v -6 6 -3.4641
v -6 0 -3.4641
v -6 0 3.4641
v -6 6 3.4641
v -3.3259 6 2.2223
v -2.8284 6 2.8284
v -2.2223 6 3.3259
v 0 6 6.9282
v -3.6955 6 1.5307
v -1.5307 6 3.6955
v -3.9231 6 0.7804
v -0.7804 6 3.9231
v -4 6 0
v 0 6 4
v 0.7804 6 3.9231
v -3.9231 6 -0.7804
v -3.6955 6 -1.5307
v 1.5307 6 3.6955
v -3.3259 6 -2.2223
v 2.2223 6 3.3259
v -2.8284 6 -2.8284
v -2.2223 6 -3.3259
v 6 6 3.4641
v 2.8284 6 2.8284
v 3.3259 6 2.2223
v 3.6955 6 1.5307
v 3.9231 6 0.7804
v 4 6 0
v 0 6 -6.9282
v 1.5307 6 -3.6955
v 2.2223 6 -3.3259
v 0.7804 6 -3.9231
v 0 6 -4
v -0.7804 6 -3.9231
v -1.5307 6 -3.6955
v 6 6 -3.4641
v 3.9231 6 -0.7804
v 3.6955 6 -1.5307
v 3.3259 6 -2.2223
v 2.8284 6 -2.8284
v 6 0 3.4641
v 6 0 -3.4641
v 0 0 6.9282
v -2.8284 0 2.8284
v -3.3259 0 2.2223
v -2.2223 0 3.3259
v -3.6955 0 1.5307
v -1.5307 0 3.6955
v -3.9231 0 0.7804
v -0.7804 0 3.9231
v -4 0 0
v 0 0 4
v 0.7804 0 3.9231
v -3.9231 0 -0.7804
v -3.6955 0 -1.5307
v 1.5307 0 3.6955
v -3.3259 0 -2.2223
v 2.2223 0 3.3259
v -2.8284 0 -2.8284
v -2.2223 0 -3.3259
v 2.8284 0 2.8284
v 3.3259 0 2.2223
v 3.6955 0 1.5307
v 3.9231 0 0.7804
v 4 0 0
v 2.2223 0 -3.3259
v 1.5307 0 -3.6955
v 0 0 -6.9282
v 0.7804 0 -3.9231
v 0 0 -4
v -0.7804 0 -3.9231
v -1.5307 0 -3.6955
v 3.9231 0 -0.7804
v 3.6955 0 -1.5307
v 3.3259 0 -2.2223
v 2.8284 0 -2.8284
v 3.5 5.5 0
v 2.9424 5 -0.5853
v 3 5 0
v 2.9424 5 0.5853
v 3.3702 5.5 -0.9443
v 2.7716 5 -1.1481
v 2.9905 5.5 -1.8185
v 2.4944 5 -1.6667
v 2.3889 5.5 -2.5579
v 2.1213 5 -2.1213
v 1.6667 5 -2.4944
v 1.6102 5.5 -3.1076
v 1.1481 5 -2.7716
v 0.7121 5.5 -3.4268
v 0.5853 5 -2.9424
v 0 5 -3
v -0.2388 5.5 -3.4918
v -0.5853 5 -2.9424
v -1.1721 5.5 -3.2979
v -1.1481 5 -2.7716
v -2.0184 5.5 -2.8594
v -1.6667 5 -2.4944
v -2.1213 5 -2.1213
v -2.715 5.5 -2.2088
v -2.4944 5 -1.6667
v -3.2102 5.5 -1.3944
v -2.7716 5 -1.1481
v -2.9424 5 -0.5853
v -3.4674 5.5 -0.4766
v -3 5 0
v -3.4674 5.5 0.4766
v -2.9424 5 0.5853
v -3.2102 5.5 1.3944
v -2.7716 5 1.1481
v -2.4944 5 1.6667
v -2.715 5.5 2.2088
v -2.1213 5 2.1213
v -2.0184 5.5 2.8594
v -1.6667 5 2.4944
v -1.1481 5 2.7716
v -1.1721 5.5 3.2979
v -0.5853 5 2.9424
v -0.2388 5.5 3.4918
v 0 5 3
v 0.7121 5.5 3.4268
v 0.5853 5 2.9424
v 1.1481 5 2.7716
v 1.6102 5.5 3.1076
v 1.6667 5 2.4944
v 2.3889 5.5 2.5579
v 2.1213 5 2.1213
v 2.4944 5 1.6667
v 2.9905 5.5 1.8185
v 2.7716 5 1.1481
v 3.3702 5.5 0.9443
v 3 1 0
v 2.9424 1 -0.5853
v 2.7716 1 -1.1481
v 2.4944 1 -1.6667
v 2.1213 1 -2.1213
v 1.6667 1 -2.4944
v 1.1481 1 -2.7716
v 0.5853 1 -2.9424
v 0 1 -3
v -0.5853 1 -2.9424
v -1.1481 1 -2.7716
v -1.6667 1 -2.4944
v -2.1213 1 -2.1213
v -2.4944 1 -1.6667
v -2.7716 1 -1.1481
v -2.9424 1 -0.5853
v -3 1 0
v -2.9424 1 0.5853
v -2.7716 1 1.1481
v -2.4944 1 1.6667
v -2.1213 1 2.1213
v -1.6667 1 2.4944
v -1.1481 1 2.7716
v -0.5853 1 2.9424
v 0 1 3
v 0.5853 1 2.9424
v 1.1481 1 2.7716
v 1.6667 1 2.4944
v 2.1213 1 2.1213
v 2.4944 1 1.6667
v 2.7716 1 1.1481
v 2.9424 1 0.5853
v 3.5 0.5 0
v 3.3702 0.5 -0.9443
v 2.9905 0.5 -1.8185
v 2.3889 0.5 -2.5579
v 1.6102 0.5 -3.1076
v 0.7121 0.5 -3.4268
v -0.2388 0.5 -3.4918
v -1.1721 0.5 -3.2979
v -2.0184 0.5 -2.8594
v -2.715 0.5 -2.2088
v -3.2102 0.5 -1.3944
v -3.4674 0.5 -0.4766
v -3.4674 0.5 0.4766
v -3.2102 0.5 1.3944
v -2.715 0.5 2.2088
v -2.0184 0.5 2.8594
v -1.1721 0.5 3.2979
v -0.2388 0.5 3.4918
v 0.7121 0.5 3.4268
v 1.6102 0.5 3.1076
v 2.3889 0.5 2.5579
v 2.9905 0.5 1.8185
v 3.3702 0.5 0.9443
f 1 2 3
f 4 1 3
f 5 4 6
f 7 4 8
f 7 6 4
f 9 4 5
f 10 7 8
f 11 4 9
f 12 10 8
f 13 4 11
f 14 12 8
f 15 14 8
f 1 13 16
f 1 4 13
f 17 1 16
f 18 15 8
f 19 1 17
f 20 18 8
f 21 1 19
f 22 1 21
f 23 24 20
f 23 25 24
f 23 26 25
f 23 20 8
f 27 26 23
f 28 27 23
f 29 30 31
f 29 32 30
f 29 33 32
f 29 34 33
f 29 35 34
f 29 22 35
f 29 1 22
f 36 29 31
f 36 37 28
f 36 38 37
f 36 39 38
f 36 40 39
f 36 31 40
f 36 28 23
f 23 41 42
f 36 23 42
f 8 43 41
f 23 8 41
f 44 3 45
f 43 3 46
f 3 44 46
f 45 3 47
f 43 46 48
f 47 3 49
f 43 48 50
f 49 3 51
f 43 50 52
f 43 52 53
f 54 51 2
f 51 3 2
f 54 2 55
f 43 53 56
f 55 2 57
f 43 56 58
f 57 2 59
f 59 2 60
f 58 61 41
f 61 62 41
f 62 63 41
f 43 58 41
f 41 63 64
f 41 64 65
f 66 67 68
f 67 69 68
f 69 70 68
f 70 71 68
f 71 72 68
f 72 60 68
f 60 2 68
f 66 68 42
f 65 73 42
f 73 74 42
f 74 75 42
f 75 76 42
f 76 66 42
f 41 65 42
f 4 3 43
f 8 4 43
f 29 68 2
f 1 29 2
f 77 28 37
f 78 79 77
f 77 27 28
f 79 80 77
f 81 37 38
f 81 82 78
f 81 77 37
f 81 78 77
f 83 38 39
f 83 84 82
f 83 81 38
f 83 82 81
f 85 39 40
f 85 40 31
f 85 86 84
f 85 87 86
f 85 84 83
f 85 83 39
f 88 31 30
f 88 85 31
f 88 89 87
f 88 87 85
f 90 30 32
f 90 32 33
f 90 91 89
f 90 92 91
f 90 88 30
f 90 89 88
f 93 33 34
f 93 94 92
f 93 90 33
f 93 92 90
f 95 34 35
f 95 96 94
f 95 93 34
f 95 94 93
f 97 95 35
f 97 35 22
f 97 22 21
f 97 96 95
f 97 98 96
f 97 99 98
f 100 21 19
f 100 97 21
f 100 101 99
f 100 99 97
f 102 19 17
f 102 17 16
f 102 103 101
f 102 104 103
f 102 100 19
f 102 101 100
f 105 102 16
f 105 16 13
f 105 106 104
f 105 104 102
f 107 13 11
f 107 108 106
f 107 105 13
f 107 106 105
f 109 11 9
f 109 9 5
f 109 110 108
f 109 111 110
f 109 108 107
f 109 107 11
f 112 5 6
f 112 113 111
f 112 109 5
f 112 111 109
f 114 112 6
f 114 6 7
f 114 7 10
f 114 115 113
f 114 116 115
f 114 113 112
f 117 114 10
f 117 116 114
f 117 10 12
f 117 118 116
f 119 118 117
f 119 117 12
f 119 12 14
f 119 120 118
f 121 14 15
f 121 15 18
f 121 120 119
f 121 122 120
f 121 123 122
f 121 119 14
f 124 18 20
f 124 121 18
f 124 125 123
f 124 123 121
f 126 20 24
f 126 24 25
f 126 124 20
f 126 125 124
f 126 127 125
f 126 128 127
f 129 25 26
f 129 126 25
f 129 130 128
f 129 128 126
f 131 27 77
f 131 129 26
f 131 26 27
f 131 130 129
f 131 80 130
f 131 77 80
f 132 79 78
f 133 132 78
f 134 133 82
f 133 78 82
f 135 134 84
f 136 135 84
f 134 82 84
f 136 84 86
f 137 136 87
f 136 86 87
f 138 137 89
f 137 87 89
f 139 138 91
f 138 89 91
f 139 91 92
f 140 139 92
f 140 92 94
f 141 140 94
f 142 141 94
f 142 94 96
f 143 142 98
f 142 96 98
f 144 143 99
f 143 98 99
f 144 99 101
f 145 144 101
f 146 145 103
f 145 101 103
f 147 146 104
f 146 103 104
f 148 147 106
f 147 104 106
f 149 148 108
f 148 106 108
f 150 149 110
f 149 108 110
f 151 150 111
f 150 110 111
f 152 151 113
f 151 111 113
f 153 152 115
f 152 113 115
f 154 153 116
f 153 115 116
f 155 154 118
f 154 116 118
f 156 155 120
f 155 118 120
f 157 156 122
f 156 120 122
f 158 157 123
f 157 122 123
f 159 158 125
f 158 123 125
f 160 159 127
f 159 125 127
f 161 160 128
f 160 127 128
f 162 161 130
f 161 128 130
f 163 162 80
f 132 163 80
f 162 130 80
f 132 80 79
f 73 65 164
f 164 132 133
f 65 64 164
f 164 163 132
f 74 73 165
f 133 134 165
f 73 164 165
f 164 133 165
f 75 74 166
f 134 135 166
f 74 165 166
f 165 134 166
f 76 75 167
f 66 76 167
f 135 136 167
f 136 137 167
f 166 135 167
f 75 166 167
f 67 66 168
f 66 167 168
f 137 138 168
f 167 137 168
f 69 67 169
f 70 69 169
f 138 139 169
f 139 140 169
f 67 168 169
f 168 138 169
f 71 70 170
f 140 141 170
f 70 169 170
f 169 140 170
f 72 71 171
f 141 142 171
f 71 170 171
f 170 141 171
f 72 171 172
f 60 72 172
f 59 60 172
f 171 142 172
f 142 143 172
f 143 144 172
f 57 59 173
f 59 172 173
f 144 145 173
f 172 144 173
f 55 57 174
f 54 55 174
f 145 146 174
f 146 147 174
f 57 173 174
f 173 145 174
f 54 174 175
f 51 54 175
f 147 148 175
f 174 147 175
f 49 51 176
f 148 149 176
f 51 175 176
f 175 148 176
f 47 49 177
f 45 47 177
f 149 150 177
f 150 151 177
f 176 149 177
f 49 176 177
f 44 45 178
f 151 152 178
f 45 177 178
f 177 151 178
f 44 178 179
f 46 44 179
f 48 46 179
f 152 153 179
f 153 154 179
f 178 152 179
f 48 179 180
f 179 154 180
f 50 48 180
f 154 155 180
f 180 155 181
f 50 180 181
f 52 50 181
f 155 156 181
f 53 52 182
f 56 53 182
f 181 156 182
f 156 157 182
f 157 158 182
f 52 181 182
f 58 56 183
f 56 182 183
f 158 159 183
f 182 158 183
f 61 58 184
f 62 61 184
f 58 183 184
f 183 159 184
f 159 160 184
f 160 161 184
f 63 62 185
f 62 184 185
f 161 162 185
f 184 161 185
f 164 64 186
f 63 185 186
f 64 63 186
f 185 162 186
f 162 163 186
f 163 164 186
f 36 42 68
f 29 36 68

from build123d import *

# Parameters (mm, degrees)
BOSS_EXTRUDE1_DEPTH = 6
SKETCH2_R           = 3
CUT_EXTRUDE1_DEPTH  = 6
CHAMFER2_SIZE       = 1


with BuildPart() as part:
    # Sketch1 → Boss-Extrude1 (new body)
    with BuildSketch(Plane(origin=(0, 0, 0), x_dir=(1, 0, 0), z_dir=(0, 1, 0))):
        Polygon((0, 6.92820323), (-6, 3.464101615), (-6, -3.464101615), (0, -6.92820323), (6, -3.464101615), (6, 3.464101615), align=None)
    extrude(amount=BOSS_EXTRUDE1_DEPTH)

    # Sketch2 → Cut-Extrude1 (cut)
    with BuildSketch(Plane(origin=(0, 6, 0), x_dir=(1, 0, 0), z_dir=(0, 1, 0))):
        Circle(SKETCH2_R)
    extrude(amount=-CUT_EXTRUDE1_DEPTH, mode=Mode.SUBTRACT)

    # Chamfer2
    chamfer2_edges = [part.edges().sort_by_distance(p)[0] for p in [
        (-3, 0, 0),
        (-3, 6, 0),
    ]]
    chamfer(chamfer2_edges, length=CHAMFER2_SIZE)


solid = part.part
